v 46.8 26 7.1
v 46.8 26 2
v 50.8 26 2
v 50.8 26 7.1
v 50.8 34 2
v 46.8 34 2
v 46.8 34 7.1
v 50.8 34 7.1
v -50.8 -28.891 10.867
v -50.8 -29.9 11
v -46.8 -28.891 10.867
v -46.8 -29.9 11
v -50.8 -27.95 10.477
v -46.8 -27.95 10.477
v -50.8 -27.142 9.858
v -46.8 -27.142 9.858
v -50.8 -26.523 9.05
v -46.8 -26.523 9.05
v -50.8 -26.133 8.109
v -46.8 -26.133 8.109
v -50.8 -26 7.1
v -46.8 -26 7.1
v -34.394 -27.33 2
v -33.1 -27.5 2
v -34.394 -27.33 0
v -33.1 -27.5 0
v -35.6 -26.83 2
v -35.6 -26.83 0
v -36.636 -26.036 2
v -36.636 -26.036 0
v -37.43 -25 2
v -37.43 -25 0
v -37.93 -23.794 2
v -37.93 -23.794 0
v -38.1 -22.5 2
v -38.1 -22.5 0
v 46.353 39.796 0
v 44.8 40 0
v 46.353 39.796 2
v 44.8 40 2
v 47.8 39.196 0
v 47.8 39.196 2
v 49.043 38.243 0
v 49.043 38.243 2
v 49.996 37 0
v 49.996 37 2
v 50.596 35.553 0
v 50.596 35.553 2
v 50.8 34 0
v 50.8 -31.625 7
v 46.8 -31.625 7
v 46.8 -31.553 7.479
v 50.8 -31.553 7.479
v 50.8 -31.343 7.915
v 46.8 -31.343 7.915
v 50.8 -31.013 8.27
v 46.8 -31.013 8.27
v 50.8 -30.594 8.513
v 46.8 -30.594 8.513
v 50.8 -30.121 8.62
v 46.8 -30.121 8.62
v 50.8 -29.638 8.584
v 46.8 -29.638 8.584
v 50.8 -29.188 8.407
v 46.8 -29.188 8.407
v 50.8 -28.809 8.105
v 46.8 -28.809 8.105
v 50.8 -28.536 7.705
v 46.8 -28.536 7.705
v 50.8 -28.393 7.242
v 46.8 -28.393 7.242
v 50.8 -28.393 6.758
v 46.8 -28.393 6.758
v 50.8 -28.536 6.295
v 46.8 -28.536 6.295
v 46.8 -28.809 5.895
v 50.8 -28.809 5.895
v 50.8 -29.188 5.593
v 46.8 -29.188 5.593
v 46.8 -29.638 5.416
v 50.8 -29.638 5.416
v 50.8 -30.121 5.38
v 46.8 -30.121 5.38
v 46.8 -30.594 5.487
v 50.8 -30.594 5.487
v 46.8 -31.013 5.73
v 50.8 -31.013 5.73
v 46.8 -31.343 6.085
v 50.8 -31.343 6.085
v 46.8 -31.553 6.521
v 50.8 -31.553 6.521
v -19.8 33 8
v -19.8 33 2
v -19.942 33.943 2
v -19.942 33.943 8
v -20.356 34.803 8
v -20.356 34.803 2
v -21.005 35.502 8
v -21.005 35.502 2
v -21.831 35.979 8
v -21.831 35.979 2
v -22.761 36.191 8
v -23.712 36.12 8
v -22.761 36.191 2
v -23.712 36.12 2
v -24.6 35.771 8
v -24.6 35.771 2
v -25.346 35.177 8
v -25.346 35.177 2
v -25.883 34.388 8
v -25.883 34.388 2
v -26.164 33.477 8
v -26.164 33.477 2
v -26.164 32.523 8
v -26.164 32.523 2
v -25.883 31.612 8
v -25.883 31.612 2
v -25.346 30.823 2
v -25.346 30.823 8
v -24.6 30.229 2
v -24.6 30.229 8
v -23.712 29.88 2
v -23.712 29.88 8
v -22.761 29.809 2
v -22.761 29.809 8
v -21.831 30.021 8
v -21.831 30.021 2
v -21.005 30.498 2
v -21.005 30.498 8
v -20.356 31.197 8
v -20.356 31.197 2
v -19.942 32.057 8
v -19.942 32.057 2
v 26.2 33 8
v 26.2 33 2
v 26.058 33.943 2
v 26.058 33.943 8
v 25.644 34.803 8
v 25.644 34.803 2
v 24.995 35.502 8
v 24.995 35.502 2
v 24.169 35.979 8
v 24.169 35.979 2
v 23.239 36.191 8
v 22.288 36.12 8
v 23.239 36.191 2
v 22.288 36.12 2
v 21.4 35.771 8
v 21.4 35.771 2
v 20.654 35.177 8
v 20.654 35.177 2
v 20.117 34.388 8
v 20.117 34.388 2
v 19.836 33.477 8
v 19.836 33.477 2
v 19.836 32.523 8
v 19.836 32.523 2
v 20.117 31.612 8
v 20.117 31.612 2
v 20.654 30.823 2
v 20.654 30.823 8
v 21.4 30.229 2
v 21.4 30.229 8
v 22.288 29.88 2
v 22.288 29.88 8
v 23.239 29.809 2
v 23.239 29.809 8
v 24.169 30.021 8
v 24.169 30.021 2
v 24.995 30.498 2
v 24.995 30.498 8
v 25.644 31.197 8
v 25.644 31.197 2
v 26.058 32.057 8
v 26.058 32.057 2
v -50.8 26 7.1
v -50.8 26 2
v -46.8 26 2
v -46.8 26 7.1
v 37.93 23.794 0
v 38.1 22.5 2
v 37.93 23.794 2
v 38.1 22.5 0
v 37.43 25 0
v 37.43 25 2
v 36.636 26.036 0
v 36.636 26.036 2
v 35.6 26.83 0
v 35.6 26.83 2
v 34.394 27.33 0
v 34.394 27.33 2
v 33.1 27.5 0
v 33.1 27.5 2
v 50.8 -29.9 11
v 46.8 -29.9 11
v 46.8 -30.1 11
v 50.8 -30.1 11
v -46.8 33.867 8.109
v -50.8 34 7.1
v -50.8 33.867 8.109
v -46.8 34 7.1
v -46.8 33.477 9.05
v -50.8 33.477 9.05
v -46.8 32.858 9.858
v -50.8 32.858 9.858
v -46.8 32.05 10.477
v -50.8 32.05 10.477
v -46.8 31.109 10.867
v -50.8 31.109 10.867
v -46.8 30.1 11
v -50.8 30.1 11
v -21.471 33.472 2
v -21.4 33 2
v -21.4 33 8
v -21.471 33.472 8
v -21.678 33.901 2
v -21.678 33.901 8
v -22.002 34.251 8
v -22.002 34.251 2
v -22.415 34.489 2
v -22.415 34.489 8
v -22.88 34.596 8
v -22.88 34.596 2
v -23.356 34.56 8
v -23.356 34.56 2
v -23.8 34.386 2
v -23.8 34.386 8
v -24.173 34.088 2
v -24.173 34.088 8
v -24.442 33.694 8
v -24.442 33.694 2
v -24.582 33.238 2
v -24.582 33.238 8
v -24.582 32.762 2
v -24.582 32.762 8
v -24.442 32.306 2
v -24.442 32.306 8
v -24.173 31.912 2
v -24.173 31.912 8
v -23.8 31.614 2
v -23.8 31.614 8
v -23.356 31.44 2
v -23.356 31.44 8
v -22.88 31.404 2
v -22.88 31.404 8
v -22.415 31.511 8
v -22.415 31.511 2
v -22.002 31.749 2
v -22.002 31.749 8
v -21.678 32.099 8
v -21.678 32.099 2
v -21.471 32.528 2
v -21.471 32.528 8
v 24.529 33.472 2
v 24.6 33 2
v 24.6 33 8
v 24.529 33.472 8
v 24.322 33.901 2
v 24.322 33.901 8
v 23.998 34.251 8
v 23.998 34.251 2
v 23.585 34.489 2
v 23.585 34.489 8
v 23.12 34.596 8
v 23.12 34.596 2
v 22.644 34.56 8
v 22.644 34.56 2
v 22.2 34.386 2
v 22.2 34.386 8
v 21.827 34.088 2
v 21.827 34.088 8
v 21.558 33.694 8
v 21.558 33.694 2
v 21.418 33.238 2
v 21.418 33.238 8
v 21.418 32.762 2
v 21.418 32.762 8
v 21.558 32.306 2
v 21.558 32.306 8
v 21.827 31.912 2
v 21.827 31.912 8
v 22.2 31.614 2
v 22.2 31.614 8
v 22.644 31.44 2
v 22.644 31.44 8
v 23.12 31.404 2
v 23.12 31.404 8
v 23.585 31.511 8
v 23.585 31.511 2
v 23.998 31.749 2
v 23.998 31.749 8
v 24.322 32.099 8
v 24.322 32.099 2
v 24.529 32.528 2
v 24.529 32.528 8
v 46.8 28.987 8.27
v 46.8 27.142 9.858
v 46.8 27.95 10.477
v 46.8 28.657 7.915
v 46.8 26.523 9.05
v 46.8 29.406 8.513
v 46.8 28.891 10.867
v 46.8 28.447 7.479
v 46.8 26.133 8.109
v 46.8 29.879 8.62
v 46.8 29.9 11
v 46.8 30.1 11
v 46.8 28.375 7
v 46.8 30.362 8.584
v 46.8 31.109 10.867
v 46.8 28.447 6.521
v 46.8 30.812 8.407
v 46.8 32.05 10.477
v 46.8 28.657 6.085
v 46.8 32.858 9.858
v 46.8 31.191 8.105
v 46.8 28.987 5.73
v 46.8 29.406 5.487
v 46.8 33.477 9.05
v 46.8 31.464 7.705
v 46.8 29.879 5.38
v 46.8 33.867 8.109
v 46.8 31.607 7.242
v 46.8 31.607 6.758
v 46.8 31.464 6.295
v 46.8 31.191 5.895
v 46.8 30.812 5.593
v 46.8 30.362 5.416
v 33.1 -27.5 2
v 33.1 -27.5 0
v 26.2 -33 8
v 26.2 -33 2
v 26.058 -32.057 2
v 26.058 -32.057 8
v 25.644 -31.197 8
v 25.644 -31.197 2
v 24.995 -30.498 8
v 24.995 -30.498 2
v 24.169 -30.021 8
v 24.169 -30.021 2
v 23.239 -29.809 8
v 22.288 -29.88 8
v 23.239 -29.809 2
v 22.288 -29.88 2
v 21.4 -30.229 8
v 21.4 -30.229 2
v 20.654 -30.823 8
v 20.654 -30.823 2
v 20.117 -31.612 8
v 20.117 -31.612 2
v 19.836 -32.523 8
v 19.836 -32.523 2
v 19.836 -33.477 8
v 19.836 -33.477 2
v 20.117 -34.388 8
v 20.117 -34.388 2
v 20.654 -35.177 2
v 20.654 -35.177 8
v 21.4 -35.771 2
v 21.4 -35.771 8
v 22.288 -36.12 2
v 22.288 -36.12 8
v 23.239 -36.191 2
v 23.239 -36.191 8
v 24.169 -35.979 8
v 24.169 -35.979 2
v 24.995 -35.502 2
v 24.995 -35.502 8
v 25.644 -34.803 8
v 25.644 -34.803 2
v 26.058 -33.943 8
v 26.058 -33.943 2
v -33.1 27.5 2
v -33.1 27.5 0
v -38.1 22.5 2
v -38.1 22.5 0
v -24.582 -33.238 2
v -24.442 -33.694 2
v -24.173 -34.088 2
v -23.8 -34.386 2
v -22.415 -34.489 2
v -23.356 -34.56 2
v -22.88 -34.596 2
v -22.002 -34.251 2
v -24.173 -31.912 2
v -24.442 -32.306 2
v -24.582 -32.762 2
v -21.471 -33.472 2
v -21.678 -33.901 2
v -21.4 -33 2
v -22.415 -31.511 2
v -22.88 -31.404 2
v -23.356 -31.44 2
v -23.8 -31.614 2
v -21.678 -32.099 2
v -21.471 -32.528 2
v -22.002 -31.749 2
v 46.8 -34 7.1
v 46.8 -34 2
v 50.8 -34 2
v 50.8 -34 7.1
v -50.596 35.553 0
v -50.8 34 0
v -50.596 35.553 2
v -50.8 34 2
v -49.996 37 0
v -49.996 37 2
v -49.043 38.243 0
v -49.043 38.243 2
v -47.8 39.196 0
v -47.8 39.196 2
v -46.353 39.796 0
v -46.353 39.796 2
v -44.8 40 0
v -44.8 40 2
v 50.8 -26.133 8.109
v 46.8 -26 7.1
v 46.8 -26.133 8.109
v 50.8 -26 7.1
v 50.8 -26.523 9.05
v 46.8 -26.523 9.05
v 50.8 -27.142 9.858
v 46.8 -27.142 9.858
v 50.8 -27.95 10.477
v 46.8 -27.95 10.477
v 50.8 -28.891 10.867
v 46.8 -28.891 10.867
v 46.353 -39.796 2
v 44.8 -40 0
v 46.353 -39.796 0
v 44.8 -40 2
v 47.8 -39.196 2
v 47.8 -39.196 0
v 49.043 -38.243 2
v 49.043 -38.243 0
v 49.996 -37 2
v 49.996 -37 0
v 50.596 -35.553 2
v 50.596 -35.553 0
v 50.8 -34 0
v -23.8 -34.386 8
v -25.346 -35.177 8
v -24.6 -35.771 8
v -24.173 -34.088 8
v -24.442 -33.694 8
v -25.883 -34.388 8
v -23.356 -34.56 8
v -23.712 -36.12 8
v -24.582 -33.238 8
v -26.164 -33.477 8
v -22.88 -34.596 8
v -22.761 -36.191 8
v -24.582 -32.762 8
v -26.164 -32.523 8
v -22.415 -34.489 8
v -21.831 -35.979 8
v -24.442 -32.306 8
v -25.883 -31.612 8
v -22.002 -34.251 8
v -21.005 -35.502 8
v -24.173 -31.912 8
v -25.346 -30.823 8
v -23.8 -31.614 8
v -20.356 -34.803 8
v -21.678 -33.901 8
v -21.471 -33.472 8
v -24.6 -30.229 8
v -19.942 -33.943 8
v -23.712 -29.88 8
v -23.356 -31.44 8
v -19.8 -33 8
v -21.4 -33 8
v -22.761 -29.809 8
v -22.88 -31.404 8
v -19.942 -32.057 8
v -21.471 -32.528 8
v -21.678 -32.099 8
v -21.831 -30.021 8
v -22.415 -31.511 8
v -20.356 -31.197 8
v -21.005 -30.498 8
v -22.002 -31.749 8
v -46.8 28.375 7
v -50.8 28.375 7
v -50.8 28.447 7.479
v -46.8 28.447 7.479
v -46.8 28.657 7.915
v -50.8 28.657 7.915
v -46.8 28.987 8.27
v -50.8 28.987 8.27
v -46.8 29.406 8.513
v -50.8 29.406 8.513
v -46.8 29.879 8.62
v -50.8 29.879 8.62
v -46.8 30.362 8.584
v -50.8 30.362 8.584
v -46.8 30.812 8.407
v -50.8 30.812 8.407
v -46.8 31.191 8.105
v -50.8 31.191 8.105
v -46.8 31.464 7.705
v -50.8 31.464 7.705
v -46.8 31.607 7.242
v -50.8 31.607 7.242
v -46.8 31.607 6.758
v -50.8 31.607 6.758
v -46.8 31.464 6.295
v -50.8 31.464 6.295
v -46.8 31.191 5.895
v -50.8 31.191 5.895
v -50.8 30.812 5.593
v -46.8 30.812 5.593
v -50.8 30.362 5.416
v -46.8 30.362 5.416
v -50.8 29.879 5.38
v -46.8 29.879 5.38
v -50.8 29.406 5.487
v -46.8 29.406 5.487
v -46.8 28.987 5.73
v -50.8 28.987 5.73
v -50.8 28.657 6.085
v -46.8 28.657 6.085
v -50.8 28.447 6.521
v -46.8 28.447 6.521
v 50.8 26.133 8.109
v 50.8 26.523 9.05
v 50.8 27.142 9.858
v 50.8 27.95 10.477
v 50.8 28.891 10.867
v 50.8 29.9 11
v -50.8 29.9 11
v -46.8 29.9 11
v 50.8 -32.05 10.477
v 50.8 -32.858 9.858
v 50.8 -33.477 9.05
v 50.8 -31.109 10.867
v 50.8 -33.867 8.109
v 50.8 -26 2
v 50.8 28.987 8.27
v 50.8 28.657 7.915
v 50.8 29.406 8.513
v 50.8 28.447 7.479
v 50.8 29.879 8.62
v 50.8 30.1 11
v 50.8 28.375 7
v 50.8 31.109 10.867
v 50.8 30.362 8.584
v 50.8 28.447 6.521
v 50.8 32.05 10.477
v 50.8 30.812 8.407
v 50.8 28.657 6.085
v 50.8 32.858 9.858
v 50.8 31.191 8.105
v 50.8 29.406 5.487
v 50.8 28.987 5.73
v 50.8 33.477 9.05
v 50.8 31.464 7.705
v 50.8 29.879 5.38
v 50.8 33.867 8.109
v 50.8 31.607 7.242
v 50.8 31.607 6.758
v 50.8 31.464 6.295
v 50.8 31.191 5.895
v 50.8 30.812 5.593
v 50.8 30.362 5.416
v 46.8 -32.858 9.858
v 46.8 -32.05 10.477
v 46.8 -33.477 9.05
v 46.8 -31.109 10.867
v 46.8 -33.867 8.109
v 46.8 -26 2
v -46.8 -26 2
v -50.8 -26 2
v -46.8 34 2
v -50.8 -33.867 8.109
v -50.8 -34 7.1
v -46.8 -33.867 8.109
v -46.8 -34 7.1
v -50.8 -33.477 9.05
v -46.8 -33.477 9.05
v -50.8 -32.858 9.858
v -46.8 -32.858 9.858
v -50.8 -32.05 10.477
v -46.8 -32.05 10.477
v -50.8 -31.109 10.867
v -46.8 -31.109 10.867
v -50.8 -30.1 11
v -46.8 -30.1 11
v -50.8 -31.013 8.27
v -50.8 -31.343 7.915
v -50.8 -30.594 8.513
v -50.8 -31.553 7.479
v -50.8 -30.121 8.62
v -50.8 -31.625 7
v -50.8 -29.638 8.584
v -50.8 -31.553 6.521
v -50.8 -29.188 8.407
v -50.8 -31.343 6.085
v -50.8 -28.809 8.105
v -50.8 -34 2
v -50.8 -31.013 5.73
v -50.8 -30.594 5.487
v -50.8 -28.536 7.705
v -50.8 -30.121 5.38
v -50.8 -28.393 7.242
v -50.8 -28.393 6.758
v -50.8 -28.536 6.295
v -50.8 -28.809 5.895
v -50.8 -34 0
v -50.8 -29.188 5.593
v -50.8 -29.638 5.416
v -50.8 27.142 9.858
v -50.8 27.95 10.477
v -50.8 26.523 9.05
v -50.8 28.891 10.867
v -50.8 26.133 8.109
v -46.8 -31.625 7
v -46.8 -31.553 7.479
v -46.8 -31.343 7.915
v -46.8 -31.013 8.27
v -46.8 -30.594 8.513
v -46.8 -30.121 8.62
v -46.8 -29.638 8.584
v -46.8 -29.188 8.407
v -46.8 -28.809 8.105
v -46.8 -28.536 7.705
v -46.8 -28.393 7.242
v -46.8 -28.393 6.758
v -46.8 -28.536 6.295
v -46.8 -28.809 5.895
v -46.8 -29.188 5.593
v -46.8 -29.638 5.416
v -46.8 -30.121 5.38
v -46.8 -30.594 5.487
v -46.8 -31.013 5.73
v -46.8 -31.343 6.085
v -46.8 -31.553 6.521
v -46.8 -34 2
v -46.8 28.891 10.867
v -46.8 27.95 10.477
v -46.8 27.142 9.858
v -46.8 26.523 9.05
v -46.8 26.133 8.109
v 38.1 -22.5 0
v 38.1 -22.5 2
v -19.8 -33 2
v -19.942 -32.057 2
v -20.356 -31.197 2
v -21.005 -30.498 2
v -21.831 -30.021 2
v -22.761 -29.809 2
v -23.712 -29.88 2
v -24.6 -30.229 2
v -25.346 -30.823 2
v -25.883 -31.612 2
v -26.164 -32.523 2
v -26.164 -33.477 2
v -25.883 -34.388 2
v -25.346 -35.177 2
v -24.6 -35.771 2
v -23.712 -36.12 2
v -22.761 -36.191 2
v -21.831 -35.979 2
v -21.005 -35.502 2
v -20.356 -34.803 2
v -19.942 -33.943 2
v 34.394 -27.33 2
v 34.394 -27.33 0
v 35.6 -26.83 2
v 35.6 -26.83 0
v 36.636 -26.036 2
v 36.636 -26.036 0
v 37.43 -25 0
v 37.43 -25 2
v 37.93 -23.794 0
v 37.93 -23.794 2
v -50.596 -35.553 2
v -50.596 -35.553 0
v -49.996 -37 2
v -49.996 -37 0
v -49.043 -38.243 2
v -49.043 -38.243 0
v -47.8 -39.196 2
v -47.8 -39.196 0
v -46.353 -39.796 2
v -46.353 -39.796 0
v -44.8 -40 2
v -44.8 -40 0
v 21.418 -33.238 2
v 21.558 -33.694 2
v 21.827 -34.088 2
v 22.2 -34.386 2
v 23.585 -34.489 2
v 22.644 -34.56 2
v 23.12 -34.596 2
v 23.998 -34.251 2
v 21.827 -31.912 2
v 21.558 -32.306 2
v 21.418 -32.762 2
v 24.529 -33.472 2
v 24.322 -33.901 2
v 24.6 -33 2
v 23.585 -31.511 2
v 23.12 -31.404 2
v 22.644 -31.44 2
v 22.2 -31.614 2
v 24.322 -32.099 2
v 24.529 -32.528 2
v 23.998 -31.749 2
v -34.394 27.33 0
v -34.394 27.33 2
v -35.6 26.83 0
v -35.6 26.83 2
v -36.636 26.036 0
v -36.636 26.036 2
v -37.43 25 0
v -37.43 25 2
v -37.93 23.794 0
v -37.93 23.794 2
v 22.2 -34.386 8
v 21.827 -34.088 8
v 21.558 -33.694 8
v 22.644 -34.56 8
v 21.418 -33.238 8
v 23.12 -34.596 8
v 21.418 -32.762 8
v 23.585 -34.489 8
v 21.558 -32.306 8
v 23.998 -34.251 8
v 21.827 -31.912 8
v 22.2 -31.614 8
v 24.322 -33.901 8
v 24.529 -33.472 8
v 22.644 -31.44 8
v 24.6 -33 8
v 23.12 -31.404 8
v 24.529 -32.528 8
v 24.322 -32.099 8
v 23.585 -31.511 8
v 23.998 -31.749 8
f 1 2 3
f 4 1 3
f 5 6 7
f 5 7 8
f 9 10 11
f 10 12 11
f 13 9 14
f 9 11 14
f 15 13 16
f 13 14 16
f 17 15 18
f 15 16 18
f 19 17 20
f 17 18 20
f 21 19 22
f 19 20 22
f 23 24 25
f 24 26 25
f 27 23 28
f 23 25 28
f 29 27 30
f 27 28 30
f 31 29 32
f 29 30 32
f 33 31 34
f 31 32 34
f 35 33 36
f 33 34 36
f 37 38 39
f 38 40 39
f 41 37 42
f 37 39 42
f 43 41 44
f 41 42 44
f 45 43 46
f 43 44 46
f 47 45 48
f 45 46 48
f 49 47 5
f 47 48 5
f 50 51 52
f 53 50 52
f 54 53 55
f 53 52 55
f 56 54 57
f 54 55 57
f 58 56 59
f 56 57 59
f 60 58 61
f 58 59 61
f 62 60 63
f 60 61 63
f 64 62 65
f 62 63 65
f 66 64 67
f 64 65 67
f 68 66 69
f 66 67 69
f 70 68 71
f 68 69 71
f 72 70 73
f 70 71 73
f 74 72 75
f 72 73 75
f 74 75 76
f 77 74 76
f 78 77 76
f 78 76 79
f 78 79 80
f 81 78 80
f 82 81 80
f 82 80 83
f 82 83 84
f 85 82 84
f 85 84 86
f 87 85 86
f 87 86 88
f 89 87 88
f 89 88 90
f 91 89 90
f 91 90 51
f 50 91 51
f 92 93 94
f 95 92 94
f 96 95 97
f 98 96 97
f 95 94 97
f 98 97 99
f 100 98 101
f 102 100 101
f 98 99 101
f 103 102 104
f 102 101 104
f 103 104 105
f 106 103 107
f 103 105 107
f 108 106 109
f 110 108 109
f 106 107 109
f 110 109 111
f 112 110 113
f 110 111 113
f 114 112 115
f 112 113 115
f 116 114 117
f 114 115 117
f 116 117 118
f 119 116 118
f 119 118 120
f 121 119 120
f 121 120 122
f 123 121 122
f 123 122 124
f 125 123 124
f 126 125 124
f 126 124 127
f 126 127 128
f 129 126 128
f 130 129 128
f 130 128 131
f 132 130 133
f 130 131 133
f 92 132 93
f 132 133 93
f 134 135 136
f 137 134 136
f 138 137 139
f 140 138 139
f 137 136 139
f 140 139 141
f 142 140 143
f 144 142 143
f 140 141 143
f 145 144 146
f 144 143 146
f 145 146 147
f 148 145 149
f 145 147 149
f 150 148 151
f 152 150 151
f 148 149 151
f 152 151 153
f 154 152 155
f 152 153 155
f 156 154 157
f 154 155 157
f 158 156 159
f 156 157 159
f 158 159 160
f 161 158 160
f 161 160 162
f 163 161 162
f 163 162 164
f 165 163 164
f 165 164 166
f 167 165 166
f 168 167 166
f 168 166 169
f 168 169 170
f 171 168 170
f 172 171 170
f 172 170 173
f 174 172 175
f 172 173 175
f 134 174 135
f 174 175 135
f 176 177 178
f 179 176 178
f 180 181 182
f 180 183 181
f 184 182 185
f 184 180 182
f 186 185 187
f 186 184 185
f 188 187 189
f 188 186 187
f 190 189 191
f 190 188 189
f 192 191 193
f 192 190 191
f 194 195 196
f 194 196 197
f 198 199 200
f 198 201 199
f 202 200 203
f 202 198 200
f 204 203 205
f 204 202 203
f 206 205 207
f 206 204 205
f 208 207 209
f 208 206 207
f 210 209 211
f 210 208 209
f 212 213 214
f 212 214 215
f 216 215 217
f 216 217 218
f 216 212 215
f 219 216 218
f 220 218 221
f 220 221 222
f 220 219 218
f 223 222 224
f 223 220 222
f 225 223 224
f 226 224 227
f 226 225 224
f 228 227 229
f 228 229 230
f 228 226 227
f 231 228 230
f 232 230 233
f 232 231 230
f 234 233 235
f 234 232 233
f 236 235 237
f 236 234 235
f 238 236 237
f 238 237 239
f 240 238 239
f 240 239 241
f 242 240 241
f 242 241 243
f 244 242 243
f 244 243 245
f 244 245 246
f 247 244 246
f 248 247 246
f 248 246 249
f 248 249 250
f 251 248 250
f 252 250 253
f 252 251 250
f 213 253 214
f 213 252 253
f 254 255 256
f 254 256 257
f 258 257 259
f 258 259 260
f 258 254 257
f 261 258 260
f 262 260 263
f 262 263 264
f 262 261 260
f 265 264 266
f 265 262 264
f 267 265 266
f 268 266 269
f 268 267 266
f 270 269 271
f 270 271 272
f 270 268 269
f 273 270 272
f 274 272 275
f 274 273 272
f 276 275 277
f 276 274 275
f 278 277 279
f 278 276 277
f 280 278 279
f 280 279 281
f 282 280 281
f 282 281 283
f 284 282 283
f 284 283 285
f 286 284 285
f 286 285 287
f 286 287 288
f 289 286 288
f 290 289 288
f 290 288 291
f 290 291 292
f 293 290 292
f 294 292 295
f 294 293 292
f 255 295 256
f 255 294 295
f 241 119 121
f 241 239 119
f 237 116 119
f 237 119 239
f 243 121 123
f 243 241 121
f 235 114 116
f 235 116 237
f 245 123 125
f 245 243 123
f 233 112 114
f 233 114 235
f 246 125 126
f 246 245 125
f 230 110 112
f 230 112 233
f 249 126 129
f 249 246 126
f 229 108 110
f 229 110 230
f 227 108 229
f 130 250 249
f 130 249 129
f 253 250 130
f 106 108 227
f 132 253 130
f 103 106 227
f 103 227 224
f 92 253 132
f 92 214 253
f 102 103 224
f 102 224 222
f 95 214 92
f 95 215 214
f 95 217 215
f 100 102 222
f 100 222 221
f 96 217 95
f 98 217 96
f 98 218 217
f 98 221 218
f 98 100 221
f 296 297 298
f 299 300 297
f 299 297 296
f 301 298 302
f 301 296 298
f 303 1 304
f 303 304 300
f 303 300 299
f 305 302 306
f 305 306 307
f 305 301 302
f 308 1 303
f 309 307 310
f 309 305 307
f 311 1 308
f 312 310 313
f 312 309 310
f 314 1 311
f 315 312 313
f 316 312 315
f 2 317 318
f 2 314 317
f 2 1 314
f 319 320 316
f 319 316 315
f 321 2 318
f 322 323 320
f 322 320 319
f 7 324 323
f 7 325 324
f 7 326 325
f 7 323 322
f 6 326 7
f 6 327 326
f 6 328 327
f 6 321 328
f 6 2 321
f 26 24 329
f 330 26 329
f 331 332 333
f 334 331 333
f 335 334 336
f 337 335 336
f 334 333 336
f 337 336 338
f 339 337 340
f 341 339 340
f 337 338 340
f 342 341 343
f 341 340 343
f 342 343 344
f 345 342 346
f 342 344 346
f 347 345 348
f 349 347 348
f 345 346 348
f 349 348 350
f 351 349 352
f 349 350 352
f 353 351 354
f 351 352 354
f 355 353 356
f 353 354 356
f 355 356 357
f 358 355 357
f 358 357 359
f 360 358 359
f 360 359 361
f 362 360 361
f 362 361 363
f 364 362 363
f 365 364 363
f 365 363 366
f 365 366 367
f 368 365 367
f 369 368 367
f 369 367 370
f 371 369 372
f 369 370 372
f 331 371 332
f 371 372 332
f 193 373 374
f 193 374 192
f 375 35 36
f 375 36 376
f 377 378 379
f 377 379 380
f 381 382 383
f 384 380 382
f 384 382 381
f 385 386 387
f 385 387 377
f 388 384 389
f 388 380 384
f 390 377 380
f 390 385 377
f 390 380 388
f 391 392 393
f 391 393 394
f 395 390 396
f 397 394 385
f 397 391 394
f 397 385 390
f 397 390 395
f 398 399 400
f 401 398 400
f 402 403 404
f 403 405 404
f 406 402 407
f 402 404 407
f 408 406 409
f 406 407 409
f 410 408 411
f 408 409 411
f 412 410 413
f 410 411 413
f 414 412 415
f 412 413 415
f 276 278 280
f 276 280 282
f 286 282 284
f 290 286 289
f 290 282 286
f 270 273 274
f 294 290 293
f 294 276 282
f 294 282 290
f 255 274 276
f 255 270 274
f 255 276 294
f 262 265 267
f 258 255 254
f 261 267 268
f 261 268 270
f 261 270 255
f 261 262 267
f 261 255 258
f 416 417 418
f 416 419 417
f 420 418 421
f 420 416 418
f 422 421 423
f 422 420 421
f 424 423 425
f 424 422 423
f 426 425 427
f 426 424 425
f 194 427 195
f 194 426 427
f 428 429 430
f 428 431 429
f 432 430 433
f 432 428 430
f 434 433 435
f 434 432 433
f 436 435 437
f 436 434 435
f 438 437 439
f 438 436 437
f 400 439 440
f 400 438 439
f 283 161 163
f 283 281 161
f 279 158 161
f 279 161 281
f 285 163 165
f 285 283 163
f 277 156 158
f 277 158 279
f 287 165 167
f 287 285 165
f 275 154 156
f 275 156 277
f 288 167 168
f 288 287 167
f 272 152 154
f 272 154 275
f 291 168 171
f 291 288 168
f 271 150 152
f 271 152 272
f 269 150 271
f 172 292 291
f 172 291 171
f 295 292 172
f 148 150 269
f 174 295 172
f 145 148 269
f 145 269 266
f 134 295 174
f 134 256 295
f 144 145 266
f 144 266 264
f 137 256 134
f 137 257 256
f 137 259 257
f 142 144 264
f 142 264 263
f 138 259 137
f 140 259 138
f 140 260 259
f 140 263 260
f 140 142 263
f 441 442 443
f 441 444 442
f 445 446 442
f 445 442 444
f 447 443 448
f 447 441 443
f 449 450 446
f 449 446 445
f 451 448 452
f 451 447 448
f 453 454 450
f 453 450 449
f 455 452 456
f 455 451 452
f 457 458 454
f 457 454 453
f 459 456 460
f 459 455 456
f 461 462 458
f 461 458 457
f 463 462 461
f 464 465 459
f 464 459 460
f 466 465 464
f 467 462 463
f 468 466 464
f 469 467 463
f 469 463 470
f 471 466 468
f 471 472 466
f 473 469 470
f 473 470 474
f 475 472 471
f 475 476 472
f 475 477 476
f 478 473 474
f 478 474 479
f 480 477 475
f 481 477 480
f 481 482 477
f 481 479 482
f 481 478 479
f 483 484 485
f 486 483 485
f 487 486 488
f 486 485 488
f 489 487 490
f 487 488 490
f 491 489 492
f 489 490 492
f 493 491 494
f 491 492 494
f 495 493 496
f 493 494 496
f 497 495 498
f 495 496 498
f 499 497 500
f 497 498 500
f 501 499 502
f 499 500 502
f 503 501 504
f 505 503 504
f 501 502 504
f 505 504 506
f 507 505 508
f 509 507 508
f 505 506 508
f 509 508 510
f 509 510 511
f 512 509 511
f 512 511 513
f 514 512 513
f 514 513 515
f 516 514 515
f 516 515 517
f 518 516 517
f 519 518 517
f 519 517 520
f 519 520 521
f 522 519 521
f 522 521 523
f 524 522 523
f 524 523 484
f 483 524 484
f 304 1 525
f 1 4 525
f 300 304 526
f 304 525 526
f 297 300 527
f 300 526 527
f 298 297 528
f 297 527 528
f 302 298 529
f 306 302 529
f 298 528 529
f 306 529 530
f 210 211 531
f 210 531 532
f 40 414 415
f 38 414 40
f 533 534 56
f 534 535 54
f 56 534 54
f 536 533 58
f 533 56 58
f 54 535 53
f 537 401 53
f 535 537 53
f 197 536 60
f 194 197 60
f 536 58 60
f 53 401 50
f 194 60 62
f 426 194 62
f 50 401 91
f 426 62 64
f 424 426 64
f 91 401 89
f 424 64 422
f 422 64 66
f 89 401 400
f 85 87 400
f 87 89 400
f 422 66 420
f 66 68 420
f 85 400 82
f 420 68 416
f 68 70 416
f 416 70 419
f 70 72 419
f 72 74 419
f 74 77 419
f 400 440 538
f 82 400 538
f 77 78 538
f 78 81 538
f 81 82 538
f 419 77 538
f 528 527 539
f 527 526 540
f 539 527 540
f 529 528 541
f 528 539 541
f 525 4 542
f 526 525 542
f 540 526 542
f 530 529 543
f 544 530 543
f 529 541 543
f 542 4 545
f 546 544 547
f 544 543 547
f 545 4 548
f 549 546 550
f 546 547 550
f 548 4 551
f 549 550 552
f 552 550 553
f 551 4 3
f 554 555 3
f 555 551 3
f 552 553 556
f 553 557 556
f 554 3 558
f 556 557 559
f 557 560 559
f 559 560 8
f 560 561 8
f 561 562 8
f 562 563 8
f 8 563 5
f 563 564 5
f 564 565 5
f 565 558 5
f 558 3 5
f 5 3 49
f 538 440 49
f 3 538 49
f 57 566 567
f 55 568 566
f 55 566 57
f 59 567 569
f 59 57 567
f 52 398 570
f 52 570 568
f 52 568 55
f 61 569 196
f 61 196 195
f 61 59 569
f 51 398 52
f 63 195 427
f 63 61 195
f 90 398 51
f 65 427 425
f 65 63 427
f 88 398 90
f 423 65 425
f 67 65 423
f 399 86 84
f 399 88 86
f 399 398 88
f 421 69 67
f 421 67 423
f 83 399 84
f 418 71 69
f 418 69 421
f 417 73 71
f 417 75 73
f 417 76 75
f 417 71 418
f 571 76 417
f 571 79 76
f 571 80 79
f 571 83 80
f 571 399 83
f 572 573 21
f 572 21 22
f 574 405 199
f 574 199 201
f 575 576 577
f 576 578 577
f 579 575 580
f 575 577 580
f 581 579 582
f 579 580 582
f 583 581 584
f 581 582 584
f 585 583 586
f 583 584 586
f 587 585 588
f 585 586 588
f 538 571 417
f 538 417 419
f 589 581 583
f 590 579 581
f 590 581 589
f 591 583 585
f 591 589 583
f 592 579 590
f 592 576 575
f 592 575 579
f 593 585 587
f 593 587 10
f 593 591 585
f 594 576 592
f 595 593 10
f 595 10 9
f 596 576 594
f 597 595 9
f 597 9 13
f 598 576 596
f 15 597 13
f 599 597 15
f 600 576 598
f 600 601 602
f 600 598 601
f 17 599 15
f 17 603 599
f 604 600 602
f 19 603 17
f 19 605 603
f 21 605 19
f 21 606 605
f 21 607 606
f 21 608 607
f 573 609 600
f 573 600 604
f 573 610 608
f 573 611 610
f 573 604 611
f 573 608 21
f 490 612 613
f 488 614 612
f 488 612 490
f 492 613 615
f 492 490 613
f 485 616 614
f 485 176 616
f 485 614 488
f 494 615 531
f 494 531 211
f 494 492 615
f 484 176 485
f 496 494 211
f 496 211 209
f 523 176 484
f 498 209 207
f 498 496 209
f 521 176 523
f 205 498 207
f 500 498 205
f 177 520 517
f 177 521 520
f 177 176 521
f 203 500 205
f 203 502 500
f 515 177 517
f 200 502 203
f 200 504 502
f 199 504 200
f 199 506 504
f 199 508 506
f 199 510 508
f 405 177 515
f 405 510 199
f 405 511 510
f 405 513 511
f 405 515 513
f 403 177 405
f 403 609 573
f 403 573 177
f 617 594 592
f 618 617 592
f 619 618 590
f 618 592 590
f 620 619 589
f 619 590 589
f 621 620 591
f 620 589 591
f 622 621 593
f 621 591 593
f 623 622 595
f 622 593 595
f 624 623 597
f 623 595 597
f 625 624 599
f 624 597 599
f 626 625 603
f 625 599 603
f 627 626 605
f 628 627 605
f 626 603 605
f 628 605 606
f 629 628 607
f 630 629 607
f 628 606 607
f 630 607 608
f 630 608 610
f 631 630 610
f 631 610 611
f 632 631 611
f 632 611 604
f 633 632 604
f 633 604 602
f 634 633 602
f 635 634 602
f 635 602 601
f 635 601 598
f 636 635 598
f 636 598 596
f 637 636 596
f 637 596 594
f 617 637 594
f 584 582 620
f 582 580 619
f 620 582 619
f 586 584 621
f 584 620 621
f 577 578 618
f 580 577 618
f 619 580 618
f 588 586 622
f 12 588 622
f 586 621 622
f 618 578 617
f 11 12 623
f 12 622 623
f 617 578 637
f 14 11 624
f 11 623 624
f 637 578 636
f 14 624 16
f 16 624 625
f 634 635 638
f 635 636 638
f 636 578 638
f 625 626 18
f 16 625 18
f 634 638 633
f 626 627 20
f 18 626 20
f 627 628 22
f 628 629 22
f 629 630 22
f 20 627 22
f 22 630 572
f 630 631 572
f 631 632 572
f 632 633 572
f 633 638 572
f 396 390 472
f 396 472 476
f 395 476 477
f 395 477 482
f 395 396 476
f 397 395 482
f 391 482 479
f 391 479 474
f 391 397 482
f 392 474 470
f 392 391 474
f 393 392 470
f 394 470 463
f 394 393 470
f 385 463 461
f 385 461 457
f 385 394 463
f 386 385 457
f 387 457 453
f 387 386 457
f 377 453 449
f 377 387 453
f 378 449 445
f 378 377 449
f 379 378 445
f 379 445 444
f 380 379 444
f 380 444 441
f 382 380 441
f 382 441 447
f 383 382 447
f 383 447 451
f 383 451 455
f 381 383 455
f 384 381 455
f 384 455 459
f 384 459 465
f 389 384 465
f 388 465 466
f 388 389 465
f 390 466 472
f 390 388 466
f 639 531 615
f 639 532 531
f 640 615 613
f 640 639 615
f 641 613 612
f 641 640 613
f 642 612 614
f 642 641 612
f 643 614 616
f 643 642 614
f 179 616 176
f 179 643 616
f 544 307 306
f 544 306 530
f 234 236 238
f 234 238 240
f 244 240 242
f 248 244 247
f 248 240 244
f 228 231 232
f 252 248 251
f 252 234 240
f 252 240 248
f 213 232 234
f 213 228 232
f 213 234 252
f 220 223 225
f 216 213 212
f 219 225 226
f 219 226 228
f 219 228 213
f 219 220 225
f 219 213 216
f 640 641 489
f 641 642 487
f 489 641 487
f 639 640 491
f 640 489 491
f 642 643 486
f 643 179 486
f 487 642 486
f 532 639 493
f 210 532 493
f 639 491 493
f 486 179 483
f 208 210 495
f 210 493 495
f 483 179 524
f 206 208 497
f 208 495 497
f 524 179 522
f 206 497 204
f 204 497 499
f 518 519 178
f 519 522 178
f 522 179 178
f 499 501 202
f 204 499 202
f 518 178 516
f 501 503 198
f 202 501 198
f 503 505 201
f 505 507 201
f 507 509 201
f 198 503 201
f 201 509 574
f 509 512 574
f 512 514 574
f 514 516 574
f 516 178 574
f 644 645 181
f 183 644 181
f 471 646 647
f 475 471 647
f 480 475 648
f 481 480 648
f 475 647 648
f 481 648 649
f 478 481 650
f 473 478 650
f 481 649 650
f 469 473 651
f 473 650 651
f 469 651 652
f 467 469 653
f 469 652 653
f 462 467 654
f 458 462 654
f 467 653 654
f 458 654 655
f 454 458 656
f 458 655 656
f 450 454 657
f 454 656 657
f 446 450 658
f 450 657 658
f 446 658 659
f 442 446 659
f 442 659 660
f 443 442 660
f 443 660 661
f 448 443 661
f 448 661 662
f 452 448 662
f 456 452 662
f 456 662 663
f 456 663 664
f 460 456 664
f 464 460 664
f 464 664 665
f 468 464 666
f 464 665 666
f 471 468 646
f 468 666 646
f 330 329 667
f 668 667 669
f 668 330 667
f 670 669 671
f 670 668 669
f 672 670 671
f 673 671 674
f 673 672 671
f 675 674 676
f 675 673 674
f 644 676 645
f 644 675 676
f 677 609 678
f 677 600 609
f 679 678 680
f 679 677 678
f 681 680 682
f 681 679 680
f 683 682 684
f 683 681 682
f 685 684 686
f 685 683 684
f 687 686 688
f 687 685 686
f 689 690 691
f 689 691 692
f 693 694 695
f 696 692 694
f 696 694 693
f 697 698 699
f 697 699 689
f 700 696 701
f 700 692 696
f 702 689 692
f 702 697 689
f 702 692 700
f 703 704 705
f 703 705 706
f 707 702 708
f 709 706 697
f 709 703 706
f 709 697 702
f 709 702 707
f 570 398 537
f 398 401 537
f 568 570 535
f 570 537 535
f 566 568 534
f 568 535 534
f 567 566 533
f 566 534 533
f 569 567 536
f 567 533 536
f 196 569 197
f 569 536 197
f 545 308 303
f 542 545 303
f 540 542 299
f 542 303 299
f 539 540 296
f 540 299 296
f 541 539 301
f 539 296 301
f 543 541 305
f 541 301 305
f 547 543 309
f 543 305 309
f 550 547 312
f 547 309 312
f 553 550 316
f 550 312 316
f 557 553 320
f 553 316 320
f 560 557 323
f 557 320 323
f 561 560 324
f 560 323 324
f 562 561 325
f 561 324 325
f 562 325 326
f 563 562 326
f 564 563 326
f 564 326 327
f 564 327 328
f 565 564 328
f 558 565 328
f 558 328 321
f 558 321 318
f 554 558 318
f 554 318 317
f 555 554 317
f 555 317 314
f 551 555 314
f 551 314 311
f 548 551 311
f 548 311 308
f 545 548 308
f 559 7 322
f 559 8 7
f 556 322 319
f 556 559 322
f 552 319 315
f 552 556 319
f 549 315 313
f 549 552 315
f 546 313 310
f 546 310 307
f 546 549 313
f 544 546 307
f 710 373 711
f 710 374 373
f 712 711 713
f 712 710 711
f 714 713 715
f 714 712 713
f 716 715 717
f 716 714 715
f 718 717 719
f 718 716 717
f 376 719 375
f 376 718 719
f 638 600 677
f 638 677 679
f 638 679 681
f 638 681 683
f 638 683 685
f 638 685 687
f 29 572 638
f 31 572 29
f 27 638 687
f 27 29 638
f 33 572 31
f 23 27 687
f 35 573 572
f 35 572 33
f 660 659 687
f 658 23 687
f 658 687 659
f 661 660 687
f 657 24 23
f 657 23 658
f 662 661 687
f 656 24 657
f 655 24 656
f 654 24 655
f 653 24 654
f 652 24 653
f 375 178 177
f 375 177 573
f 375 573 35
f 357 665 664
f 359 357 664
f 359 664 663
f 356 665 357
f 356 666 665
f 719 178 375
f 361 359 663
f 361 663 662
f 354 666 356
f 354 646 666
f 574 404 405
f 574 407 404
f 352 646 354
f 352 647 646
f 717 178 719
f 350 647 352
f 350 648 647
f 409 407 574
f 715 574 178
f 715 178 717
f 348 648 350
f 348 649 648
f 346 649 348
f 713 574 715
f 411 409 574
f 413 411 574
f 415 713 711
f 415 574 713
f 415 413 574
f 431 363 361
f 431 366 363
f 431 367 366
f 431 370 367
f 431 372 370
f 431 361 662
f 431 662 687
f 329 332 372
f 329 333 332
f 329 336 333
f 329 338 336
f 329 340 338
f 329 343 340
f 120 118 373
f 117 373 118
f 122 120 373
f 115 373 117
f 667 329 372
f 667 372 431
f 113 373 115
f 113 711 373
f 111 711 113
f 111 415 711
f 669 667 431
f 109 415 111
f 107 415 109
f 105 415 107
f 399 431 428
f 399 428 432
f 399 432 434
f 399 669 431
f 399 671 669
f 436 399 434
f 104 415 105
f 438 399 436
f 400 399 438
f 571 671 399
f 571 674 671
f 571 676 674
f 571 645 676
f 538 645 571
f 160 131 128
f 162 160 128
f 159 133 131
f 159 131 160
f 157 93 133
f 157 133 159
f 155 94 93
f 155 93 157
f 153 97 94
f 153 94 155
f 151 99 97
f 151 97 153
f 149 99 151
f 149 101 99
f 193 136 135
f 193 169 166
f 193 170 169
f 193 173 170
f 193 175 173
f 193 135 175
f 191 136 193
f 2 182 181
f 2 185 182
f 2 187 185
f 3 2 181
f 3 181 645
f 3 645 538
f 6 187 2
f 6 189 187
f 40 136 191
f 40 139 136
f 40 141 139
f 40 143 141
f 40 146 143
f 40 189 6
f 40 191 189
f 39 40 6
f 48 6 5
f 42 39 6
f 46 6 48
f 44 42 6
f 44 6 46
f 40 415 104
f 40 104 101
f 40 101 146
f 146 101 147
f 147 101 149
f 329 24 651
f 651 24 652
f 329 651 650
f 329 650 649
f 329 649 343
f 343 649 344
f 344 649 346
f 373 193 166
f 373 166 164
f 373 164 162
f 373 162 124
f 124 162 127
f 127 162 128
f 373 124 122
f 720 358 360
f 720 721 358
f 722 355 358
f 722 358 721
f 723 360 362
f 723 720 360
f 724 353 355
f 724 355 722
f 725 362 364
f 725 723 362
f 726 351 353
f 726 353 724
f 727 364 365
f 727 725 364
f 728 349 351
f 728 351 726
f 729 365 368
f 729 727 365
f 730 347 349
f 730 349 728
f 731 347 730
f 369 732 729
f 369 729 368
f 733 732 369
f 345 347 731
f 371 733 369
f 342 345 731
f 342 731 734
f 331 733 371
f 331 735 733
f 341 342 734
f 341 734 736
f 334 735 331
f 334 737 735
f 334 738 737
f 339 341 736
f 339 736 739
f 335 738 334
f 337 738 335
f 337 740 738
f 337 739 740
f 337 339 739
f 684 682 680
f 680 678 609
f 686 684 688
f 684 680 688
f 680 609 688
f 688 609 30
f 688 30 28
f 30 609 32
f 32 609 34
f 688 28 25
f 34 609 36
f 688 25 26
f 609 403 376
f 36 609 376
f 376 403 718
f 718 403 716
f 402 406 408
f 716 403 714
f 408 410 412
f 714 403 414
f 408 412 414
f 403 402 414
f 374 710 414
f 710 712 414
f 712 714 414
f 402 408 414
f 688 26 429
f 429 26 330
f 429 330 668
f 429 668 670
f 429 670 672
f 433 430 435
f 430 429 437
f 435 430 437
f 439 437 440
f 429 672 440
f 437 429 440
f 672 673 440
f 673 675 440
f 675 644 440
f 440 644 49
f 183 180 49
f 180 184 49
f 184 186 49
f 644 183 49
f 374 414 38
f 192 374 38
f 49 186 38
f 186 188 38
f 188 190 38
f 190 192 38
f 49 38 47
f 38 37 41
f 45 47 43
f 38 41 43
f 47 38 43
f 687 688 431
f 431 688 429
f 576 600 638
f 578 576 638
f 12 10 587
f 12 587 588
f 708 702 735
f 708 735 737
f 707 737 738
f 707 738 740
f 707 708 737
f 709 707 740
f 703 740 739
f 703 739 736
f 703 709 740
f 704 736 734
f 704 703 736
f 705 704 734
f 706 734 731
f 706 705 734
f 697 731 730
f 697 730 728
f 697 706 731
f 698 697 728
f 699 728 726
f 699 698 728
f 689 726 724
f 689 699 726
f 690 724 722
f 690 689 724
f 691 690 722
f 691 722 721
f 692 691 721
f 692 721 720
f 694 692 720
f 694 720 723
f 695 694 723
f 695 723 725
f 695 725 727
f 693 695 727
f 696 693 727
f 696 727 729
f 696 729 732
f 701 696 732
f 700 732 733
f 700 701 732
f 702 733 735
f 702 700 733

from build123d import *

# Parameters (mm, degrees)
SKETCH_W        = 101.6
SKETCH_H        = 80
PAD_DEPTH       = 2
SKETCH001_W     = 4
SKETCH001_H     = 8
PAD001_DEPTH    = 9
SKETCH002_R     = 1.625
POCKET_DEPTH    = 101.6
SKETCH003_R     = 1.625
POCKET001_DEPTH = 101.6
SKETCH004_R     = 3.2
SKETCH004_R_2   = 1.6
PAD002_DEPTH    = 6
SKETCH005_W     = 76.2
SKETCH005_H     = 55
POCKET002_DEPTH = 4
FILLET_R        = 3.9
FILLET001_R     = 6
FILLET002_R     = 5


with BuildPart() as part:
    # Sketch → Pad (new body)
    with BuildSketch(Plane.XY):
        Rectangle(SKETCH_W, SKETCH_H)
    extrude(amount=PAD_DEPTH)

    # Sketch001 (on Face6 of Pad) → Pad001 (join)
    with BuildSketch(Plane.XY.offset(2)):
        with Locations((-48.8, 30)):
            Rectangle(SKETCH001_W, SKETCH001_H)
        with Locations((48.8, 30)):
            Rectangle(SKETCH001_W, SKETCH001_H)
        with Locations((48.8, -30)):
            Rectangle(SKETCH001_W, SKETCH001_H)
        with Locations((-48.8, -30)):
            Rectangle(SKETCH001_W, SKETCH001_H)
    extrude(amount=PAD001_DEPTH)

    # Sketch002 (on Face8 of Pad001) → Pocket (cut)
    with BuildSketch(Plane(origin=(-50.8, 0, 0), x_dir=(0, -1, 0), z_dir=(-1, 0, 0))):
        with Locations((-30, 7)):
            Circle(SKETCH002_R)
    extrude(amount=-POCKET_DEPTH, mode=Mode.SUBTRACT)

    # Sketch003 (on Face7 of Pocket) → Pocket001 (cut)
    with BuildSketch(Plane(origin=(-50.8, 0, 0), x_dir=(0, -1, 0), z_dir=(-1, 0, 0))):
        with Locations((30, 7)):
            Circle(SKETCH003_R)
    extrude(amount=-POCKET001_DEPTH, mode=Mode.SUBTRACT)

    # Sketch004 (on Face5 of Pocket001) → Pad002 (join)
    with BuildSketch(Plane.XY.offset(2)):
        with Locations((-23, 33)):
            Circle(SKETCH004_R)
        with Locations((-23, 33)):
            Circle(SKETCH004_R_2, mode=Mode.SUBTRACT)
        with Locations((23, 33)):
            Circle(SKETCH004_R)
        with Locations((23, 33)):
            Circle(SKETCH004_R_2, mode=Mode.SUBTRACT)
        with Locations((23, -33)):
            Circle(SKETCH004_R)
        with Locations((23, -33)):
            Circle(SKETCH004_R_2, mode=Mode.SUBTRACT)
        with Locations((-23, -33)):
            Circle(SKETCH004_R)
        with Locations((-23, -33)):
            Circle(SKETCH004_R_2, mode=Mode.SUBTRACT)
    extrude(amount=PAD002_DEPTH)

    # Sketch005 (on Face5 of Pad002) → Pocket002 (cut)
    with BuildSketch(Plane.XY.offset(2)):
        Rectangle(SKETCH005_W, SKETCH005_H)
    extrude(amount=-POCKET002_DEPTH, mode=Mode.SUBTRACT)

    # Fillet
    fillet_edges = [part.edges().sort_by_distance(p)[0] for p in [
        (48.8, -34, 11),
        (48.8, -26, 11),
        (48.8, 26, 11),
        (48.8, 34, 11),
        (-48.8, 34, 11),
        (-48.8, 26, 11),
        (-48.8, -26, 11),
        (-48.8, -34, 11),
    ]]
    fillet(fillet_edges, radius=FILLET_R)

    # Fillet001
    fillet001_edges = [part.edges().sort_by_distance(p)[0] for p in [
        (-50.8, -40, 1),
        (50.8, -40, 1),
        (-50.8, 40, 1),
        (50.8, 40, 1),
    ]]
    fillet(fillet001_edges, radius=FILLET001_R)

    # Fillet002
    fillet002_edges = [part.edges().sort_by_distance(p)[0] for p in [
        (38.1, 27.5, 1),
        (38.1, -27.5, 1),
        (-38.1, 27.5, 1),
        (-38.1, -27.5, 1),
    ]]
    fillet(fillet002_edges, radius=FILLET002_R)


solid = part.part
